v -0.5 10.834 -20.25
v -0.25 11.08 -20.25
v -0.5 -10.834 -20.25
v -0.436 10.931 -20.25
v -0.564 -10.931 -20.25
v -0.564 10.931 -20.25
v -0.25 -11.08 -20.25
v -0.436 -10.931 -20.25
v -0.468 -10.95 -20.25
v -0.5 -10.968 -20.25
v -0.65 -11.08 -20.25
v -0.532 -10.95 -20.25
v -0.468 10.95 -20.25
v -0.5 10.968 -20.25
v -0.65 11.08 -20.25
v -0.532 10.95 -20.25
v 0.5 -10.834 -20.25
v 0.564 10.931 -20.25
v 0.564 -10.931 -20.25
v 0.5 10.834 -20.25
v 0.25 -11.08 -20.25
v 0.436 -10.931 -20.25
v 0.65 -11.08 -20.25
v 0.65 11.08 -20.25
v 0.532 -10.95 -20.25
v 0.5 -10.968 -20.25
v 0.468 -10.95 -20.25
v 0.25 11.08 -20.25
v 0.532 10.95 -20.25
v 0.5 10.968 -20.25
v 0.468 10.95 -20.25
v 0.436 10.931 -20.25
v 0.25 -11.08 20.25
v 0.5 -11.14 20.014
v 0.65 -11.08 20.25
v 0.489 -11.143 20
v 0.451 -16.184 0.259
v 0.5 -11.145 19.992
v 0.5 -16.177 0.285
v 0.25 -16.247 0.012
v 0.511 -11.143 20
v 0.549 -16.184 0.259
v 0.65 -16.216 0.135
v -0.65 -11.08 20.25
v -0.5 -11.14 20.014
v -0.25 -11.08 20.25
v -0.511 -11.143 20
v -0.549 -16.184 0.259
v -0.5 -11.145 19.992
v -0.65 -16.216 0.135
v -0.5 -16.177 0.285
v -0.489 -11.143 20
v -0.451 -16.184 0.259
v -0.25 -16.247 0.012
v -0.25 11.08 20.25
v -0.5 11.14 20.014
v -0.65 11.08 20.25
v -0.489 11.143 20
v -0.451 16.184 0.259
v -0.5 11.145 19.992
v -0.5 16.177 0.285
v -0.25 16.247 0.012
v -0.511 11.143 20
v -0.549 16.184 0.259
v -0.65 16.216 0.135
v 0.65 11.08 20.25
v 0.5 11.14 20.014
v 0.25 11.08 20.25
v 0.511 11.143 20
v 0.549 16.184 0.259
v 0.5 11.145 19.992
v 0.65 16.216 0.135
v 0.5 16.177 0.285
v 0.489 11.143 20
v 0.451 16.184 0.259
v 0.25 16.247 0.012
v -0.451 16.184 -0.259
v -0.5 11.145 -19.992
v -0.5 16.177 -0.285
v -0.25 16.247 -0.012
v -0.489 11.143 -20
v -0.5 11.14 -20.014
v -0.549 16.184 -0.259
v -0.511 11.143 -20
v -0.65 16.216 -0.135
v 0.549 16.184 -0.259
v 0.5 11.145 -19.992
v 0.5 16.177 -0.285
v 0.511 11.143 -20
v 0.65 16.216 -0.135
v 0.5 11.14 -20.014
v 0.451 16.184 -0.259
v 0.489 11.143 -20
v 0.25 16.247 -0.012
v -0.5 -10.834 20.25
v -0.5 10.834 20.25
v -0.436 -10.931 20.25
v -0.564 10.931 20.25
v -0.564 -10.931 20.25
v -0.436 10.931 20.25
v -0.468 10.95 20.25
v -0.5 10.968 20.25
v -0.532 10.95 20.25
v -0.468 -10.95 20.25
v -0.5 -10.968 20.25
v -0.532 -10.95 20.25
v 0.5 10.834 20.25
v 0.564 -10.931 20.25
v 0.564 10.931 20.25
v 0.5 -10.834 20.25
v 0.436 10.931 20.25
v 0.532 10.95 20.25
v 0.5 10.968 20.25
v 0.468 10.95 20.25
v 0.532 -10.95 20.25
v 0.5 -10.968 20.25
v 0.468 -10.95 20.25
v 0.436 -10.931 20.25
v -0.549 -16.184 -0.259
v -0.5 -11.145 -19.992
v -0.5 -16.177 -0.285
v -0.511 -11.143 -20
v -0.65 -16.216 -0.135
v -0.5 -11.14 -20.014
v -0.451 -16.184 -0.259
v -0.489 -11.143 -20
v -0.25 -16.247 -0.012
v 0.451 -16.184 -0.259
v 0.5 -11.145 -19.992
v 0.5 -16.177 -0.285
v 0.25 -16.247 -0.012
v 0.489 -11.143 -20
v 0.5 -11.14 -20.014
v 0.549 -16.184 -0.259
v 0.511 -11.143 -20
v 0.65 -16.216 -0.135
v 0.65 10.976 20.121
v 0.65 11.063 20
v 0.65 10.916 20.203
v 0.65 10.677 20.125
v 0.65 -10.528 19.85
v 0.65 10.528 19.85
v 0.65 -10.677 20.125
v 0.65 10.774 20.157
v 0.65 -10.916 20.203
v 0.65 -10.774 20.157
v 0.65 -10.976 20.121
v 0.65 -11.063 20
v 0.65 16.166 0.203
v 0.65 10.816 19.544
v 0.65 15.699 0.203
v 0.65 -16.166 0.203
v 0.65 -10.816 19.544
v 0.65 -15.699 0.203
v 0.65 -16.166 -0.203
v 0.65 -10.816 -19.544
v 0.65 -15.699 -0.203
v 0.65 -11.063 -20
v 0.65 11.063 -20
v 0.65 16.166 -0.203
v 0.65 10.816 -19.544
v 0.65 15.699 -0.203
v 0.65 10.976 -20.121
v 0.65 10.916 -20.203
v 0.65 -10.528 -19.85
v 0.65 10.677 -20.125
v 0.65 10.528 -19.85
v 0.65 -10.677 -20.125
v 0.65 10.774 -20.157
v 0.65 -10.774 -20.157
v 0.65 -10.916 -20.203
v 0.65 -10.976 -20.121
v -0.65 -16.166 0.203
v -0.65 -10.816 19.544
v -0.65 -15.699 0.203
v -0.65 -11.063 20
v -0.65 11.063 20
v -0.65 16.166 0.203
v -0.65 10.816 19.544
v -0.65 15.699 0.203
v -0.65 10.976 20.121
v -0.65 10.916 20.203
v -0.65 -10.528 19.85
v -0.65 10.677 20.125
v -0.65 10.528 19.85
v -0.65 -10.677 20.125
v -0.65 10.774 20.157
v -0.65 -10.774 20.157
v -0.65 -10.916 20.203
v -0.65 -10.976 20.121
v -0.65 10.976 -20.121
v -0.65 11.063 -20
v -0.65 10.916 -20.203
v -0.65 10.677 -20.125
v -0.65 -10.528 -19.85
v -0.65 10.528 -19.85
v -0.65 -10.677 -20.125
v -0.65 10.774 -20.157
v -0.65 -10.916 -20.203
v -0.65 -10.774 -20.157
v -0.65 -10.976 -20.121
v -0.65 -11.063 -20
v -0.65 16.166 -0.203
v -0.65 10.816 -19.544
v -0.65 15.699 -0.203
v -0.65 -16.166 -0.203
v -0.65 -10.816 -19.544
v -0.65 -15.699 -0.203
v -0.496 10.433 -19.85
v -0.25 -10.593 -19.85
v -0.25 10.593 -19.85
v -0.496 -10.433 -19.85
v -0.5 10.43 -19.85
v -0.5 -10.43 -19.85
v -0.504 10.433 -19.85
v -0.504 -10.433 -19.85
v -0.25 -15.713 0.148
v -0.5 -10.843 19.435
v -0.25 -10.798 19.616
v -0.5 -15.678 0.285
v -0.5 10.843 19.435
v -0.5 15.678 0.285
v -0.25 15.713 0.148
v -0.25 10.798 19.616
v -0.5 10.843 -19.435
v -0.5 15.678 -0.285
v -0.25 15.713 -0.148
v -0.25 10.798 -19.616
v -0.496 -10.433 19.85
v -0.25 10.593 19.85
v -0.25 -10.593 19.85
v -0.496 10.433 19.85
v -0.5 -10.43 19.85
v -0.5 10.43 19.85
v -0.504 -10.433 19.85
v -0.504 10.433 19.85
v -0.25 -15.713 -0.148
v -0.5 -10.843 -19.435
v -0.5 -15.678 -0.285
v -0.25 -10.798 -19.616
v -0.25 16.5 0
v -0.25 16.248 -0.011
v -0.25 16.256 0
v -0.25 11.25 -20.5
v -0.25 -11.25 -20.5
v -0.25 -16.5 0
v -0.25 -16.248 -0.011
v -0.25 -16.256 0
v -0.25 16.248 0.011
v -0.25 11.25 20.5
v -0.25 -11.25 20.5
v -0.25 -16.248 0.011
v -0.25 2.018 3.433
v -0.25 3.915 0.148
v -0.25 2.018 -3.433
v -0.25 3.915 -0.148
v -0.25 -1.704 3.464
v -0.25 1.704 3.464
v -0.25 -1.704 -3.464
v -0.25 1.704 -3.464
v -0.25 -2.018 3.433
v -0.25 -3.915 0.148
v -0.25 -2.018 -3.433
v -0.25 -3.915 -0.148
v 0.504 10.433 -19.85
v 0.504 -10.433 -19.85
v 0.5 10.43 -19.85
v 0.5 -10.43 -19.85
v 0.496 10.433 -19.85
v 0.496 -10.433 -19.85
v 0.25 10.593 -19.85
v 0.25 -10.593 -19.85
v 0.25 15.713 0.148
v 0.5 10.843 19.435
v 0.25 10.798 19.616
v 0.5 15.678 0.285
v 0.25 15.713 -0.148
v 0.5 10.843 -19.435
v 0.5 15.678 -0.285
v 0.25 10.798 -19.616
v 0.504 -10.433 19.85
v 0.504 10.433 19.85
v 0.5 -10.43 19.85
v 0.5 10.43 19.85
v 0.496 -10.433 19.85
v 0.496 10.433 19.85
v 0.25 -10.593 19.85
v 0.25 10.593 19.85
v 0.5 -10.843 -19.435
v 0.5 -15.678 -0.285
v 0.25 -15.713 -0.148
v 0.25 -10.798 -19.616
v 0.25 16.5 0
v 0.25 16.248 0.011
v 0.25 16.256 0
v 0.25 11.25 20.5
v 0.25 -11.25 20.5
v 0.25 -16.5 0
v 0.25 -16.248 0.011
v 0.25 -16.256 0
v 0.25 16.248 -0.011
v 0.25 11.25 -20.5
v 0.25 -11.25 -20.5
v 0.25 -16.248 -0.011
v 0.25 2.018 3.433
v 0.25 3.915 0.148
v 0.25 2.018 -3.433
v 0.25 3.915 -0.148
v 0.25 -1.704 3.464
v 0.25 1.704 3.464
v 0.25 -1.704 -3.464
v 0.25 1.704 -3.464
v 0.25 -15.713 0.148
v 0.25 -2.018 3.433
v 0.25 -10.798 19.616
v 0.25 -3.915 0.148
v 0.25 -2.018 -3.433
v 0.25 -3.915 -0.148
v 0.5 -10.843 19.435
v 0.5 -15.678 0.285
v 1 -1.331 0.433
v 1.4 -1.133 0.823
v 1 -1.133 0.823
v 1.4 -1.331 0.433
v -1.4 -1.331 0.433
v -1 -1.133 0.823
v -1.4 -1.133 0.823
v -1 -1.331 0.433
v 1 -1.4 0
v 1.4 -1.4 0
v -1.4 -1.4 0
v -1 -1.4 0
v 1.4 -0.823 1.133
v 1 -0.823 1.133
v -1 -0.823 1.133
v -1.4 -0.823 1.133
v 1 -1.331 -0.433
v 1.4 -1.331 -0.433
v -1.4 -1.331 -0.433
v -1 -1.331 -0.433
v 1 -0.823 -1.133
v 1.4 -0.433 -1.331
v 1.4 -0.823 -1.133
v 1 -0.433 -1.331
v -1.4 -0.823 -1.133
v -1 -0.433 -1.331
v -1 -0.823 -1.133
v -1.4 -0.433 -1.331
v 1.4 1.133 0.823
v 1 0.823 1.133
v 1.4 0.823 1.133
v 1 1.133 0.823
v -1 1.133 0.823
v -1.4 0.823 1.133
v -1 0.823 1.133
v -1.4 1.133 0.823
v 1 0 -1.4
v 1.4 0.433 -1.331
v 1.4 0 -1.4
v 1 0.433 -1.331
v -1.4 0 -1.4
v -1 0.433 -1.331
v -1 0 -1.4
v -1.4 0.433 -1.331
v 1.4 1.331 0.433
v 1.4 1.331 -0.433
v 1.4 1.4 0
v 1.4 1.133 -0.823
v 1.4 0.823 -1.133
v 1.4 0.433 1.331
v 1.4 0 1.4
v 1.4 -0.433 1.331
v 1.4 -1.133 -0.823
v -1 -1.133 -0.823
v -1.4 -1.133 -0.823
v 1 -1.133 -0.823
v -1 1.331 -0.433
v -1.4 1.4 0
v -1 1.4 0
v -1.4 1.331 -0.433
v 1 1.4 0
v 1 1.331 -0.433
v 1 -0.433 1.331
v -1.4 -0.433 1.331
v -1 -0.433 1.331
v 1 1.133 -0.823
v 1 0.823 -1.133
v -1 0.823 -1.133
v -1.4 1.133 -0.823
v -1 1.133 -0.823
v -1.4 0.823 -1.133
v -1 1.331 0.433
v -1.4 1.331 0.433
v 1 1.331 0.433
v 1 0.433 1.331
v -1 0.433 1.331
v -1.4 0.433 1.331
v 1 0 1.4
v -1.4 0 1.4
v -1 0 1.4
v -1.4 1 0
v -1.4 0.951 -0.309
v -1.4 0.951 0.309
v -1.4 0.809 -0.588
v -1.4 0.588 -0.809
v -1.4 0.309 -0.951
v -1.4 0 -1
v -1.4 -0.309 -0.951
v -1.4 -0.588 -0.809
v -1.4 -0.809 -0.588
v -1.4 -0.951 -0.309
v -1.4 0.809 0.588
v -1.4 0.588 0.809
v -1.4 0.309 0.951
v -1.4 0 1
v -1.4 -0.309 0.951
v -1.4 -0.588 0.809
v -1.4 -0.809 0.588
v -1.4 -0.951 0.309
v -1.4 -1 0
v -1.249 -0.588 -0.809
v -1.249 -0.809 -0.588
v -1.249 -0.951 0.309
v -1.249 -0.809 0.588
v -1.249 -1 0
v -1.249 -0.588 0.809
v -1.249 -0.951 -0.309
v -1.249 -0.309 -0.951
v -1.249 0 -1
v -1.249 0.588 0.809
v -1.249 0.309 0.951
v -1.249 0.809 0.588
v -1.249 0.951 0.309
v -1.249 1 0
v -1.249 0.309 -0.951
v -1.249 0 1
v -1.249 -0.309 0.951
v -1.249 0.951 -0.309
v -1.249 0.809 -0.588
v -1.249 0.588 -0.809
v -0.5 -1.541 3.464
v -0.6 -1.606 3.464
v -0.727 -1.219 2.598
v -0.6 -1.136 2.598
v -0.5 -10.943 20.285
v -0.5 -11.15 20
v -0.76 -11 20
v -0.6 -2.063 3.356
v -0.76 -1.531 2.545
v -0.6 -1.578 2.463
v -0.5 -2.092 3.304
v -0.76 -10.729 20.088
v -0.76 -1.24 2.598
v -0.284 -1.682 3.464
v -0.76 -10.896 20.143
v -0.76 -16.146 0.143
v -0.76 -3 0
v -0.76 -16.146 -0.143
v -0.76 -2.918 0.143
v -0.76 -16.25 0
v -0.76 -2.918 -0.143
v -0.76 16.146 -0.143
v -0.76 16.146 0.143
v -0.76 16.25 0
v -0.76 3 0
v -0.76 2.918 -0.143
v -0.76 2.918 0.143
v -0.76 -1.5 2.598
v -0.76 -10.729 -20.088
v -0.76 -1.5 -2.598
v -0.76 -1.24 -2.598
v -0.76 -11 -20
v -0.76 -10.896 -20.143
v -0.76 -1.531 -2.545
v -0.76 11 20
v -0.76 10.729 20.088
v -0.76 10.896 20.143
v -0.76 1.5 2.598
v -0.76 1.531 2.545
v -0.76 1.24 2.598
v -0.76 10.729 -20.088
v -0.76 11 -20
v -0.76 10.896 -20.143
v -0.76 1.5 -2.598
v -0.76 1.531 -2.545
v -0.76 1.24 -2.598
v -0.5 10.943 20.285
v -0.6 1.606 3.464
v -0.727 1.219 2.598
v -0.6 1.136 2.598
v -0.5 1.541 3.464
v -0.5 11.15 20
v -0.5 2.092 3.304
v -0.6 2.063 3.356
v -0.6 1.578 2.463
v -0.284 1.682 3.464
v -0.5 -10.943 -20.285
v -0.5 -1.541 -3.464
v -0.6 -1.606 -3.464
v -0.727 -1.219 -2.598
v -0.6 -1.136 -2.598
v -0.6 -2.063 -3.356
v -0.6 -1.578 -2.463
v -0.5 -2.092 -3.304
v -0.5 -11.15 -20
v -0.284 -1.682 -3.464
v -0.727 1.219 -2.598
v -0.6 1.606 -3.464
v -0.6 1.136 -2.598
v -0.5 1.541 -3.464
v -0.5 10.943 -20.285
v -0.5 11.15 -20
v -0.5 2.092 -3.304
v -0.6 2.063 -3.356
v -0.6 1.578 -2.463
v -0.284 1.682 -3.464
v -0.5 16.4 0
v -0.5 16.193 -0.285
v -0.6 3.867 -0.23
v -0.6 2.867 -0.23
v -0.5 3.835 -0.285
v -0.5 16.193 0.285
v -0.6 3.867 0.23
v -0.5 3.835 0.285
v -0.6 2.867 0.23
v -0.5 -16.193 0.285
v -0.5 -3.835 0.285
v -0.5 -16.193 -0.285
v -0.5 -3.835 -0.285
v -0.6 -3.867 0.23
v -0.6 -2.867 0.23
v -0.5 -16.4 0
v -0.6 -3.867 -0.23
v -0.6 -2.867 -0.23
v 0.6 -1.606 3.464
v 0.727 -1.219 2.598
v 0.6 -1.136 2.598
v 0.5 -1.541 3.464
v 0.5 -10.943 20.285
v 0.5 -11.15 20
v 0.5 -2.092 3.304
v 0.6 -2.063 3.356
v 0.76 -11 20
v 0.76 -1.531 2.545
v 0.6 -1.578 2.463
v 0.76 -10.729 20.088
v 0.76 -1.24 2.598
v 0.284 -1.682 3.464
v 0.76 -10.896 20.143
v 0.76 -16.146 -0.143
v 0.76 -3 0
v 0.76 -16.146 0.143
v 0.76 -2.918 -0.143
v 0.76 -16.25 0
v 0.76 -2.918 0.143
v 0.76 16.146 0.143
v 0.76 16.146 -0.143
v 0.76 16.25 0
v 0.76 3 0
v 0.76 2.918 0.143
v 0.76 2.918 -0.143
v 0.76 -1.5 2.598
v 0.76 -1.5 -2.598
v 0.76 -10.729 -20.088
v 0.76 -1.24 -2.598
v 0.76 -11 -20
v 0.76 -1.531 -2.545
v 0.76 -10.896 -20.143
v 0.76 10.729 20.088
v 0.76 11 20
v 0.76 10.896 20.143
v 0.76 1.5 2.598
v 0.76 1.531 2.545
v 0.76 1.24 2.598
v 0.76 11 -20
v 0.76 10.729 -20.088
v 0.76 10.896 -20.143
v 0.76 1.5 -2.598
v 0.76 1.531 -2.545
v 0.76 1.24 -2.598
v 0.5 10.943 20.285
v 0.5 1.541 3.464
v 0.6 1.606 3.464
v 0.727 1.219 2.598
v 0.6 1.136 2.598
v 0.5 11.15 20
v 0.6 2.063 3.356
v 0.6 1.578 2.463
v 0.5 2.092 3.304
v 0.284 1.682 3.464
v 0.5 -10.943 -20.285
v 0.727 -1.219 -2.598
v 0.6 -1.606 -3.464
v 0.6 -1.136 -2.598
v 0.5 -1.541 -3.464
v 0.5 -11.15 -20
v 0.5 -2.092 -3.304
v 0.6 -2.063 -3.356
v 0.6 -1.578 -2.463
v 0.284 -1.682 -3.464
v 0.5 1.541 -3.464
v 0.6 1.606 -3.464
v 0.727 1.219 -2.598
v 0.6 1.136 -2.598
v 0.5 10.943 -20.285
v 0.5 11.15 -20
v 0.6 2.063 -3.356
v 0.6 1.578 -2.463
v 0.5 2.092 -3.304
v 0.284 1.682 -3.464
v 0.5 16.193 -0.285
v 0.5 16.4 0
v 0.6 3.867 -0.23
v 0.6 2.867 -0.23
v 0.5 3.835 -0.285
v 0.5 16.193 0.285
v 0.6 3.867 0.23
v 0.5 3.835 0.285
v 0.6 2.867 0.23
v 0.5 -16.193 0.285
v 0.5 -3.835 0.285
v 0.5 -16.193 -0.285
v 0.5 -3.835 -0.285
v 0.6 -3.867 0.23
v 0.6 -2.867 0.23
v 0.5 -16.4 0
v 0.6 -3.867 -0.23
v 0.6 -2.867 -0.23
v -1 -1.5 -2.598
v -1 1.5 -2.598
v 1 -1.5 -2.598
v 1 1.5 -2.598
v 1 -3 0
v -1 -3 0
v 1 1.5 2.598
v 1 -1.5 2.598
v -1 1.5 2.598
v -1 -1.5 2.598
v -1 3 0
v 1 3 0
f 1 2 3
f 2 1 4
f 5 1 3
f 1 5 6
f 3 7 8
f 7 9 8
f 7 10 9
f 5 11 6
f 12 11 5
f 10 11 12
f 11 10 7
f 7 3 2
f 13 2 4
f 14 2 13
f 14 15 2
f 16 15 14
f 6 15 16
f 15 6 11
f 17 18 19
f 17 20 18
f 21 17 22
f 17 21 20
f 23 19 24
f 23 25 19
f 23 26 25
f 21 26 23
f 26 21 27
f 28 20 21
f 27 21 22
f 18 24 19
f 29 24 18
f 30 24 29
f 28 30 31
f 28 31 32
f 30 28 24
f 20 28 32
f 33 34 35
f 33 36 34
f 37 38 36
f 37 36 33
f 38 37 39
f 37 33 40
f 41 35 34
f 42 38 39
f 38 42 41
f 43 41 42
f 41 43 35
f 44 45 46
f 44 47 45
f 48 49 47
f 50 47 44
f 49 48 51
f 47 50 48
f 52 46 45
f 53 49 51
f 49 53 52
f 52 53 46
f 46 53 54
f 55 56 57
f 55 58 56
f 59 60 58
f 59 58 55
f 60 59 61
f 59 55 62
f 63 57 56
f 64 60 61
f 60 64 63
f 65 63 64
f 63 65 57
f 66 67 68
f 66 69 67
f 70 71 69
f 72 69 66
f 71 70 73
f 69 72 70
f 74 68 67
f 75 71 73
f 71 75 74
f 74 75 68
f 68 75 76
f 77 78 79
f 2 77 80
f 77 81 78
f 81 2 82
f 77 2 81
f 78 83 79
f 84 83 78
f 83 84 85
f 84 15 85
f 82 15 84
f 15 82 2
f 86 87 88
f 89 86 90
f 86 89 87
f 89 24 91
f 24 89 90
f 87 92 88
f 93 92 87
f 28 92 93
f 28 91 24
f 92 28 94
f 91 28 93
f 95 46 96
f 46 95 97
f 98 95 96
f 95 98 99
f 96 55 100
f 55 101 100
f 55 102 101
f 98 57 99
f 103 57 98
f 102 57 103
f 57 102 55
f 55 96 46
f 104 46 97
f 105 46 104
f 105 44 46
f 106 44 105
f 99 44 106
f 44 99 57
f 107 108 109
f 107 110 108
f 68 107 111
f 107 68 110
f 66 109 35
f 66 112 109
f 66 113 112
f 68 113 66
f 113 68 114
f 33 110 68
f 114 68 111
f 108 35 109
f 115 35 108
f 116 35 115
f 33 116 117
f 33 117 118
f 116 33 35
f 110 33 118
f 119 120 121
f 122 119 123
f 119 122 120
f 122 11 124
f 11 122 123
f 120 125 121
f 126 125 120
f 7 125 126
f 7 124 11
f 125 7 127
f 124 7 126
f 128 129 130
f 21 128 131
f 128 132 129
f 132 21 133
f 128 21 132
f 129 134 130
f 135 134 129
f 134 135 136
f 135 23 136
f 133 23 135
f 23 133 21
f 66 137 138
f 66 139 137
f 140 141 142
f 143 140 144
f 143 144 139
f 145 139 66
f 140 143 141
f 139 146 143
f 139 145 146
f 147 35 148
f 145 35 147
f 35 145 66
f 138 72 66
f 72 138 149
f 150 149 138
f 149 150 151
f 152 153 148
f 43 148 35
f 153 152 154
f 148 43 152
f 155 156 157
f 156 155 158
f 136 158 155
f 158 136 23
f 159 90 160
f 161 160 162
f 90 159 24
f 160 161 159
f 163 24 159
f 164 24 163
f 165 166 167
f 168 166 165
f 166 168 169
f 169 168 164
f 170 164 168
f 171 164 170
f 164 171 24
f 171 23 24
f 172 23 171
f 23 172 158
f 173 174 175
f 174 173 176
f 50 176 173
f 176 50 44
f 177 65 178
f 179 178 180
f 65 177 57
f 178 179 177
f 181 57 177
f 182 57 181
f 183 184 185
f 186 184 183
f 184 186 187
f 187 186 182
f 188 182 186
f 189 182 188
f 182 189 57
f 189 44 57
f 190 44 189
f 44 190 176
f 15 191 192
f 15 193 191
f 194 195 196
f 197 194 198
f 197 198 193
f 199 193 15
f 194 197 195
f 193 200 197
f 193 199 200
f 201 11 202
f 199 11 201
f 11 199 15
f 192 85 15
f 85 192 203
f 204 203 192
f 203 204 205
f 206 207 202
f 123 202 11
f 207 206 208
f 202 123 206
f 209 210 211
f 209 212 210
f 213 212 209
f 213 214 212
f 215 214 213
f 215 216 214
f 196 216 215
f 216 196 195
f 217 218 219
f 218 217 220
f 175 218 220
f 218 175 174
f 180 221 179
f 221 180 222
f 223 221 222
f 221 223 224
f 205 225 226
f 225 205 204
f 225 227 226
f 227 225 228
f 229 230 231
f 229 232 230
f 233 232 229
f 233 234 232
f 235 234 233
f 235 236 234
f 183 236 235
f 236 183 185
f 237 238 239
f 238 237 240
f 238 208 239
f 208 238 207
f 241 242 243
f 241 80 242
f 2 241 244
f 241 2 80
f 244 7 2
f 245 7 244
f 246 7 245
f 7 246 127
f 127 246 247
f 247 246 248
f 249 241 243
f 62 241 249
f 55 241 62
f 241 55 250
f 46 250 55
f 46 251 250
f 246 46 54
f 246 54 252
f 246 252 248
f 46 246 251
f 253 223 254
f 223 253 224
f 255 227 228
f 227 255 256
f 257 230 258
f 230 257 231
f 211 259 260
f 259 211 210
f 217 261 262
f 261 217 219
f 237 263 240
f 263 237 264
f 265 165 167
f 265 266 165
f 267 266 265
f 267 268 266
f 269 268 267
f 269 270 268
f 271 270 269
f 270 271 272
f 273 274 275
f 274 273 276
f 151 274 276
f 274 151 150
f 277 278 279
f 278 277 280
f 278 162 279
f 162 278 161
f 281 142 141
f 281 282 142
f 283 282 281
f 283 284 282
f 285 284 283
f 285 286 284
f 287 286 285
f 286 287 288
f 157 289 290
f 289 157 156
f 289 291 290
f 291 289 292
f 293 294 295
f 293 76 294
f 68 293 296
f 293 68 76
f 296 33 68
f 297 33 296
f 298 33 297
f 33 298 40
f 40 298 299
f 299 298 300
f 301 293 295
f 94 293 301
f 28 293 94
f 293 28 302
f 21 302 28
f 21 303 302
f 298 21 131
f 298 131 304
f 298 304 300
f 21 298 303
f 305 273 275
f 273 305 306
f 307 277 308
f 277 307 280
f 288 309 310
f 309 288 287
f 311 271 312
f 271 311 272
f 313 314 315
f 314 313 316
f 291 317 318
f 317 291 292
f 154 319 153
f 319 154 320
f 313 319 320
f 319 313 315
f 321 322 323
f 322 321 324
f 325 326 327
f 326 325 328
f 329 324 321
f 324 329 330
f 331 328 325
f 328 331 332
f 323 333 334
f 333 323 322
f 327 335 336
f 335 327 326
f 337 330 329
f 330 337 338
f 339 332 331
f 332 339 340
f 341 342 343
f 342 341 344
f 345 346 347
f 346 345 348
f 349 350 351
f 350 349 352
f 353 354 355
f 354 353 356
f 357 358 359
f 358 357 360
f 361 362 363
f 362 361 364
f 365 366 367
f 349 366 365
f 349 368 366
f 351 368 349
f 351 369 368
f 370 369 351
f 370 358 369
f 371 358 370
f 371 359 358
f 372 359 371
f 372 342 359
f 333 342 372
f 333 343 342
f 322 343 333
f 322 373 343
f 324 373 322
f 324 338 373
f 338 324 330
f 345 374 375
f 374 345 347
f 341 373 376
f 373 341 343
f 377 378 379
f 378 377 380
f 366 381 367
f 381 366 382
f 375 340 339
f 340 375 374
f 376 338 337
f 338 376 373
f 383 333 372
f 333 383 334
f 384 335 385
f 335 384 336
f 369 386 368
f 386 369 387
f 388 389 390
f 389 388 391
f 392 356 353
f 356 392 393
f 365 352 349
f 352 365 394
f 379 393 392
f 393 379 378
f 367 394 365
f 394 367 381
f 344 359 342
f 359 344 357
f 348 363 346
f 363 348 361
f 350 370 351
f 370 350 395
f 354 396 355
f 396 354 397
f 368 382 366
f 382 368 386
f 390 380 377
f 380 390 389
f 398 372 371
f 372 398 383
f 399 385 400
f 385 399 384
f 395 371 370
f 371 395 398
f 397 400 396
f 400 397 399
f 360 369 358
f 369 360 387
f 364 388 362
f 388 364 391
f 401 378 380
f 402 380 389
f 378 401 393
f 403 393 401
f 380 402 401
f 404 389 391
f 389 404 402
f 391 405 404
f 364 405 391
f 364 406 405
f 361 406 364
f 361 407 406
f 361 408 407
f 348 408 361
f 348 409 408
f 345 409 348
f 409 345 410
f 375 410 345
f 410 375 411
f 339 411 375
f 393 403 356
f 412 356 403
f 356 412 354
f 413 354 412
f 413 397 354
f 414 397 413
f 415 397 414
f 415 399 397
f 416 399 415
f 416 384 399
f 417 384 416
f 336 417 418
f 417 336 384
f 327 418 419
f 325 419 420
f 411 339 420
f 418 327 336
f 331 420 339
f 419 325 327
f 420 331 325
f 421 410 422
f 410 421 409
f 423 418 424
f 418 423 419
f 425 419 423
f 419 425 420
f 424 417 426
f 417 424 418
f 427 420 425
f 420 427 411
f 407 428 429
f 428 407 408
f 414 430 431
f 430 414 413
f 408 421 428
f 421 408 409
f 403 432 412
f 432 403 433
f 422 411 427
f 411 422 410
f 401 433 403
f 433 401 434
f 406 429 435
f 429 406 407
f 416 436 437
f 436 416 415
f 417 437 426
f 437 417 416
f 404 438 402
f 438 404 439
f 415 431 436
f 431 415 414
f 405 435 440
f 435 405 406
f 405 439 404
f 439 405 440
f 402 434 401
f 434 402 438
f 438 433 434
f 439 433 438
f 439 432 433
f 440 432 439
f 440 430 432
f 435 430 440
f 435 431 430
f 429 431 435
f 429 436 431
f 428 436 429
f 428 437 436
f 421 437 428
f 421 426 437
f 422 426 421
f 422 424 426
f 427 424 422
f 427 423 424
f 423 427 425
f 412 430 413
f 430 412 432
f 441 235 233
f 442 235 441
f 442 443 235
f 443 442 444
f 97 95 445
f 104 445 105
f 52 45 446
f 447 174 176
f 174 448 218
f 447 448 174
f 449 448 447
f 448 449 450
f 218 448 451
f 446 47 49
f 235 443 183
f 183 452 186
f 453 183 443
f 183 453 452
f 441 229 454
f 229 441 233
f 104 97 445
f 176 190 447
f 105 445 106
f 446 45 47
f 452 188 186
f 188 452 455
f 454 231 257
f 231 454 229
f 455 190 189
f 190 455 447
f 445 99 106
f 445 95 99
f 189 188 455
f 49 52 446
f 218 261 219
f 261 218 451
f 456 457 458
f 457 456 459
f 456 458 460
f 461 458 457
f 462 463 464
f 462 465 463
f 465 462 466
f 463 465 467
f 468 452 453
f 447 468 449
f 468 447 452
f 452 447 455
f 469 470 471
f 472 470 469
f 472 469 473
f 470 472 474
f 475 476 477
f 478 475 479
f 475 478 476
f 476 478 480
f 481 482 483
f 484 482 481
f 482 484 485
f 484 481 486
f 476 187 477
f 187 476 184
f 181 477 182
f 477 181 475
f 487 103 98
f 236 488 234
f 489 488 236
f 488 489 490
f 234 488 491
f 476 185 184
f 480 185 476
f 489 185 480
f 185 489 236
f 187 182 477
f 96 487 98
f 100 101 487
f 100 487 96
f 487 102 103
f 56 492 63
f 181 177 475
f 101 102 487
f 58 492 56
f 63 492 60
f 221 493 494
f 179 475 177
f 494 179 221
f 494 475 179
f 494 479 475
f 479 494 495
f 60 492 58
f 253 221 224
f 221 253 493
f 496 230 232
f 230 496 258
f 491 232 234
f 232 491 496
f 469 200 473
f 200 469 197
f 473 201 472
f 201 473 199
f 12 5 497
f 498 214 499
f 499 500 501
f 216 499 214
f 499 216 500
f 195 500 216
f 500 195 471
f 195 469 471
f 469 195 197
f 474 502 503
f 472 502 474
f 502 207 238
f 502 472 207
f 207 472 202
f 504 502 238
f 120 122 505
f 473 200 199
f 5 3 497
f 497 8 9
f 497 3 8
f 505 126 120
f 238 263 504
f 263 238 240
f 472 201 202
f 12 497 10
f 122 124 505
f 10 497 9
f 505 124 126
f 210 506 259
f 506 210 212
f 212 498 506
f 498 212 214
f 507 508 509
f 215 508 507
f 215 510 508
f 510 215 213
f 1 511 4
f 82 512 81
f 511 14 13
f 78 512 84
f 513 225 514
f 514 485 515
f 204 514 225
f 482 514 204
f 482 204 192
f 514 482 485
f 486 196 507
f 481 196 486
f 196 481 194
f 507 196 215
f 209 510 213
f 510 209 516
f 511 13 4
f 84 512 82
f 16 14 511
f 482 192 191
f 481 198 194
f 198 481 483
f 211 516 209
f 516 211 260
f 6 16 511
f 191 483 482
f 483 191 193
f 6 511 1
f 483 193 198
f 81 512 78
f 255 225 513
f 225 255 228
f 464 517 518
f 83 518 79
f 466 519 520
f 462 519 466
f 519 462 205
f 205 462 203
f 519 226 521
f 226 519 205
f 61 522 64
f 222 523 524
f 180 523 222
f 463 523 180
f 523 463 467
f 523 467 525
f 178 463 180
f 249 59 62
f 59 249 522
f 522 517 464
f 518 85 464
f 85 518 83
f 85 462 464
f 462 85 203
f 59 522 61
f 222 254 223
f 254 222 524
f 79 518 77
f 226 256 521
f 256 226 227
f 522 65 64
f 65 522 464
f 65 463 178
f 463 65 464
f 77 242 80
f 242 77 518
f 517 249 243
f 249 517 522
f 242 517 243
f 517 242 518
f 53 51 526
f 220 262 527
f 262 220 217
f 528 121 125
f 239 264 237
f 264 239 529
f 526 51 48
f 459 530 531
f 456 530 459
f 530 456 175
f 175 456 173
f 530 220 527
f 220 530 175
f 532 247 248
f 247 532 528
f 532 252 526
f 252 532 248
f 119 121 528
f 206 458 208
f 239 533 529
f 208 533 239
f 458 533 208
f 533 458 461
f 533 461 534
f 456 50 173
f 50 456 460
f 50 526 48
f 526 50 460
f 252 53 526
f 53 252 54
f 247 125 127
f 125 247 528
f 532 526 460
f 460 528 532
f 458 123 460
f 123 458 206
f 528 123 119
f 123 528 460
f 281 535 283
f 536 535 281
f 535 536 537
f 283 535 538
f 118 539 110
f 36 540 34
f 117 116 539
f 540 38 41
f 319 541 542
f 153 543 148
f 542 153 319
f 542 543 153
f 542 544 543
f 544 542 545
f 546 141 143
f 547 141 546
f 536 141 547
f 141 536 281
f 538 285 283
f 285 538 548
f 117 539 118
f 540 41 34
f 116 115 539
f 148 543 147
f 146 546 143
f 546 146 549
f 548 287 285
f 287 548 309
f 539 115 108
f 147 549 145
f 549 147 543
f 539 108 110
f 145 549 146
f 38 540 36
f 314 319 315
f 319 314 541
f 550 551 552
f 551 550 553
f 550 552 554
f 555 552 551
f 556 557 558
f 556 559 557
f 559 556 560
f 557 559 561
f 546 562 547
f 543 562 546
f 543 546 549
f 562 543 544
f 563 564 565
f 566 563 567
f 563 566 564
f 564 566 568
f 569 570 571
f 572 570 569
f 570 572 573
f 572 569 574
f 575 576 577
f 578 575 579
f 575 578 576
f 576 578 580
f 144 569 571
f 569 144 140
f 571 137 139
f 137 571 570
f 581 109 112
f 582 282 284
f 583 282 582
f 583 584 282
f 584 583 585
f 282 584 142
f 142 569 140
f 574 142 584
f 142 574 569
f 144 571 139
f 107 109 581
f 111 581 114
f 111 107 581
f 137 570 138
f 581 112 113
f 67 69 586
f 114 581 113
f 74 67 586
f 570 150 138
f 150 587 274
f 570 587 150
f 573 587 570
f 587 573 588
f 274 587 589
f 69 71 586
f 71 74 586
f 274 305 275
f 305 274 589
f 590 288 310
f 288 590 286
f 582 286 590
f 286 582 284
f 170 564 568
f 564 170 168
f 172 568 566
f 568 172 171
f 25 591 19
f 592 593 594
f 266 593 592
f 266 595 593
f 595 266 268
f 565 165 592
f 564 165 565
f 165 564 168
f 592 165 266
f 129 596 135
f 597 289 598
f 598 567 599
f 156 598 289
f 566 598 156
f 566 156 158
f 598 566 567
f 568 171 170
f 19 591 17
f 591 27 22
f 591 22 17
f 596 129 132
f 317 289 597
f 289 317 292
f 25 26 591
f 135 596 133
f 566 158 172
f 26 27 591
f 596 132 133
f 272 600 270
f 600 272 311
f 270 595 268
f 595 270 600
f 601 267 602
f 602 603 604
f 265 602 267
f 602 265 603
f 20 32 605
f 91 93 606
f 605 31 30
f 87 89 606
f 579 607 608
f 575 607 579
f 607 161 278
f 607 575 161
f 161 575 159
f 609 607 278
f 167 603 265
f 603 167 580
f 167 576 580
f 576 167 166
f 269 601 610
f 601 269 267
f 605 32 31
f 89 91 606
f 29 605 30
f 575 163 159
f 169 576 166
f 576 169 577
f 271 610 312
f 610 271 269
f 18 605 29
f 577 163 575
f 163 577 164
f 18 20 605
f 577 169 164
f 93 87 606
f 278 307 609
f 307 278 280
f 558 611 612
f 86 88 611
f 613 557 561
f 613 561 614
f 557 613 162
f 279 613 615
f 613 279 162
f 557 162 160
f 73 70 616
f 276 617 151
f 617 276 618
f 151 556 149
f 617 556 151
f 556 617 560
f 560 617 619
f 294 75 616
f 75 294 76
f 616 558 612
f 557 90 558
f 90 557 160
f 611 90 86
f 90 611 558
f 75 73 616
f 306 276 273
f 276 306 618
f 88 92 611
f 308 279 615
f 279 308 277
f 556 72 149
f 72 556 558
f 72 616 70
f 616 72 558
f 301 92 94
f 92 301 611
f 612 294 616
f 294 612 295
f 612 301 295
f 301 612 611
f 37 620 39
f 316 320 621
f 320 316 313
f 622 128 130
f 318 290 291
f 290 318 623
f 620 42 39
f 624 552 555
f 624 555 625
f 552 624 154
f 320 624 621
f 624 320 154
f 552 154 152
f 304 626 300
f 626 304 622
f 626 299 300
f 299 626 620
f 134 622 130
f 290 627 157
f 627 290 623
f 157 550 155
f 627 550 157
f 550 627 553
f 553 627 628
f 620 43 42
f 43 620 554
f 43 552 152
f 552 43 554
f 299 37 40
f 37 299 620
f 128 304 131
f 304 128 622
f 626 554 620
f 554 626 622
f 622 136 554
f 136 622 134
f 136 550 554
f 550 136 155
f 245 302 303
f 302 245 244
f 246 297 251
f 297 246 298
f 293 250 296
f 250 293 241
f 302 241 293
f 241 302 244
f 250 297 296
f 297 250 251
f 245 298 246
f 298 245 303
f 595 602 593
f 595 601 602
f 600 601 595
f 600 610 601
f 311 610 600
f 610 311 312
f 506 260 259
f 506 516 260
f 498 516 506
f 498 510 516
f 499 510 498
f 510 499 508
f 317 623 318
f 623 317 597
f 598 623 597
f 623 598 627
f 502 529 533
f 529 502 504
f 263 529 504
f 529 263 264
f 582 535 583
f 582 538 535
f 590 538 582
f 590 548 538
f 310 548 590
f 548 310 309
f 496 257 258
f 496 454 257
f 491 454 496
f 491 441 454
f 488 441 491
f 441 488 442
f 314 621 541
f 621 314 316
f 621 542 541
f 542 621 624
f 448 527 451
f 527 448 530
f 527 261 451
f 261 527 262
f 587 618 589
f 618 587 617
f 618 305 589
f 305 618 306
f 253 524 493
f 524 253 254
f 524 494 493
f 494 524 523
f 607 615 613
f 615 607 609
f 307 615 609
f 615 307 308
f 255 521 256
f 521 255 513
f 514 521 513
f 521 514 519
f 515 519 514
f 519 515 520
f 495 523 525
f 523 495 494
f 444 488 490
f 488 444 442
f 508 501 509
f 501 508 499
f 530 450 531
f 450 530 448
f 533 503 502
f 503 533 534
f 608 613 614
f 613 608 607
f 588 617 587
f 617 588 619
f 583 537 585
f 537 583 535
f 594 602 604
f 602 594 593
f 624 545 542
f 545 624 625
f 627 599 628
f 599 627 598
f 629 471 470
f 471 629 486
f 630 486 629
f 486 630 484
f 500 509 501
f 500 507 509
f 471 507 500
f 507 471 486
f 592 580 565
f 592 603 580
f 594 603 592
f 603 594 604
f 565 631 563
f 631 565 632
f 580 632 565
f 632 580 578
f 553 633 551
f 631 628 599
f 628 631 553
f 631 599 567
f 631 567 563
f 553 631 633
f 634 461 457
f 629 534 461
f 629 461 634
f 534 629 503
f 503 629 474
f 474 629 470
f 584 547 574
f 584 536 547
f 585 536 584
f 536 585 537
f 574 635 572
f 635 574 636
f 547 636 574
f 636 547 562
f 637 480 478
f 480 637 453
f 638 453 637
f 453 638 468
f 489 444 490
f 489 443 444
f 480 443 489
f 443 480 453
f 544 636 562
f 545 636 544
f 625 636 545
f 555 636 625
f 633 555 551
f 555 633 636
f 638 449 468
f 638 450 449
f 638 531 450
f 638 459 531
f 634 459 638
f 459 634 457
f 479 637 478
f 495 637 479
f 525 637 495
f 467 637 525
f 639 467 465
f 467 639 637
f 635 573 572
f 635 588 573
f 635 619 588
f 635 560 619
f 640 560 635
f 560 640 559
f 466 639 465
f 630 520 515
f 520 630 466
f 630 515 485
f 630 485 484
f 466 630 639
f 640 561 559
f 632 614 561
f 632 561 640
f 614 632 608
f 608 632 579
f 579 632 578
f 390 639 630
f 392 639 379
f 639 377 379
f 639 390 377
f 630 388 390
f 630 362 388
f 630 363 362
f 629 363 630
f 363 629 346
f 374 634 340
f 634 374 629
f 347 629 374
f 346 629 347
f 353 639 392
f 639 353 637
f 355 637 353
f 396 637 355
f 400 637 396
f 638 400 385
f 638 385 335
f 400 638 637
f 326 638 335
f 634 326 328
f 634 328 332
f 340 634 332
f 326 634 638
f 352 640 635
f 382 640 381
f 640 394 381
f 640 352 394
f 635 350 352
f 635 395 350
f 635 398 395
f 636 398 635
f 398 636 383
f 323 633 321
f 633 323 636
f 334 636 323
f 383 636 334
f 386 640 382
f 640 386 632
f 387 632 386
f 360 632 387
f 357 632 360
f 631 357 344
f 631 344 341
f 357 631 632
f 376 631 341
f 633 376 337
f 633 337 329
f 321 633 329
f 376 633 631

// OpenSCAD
epsilon = 0.001;
a = [0 - epsilon, 41/2];
b = [22.5/2, 41/2];
c = [33/2, 0];
d = [22.5/2, -41/2];
e = [0 - epsilon, -41/2];

rotate([0,0,-90]) rotate([90,0,0]) panel();

module panel() {
	/* basic panel */
	translate([0,0,-0.25]) linear_extrude(height=0.5) {
		polygon(points=[a,b,c,d,e],paths=[[0,1,2,3,4,5,0]]);
		mirror([1,0,0]) polygon(points=[a,b,c,d,e],paths=[[0,1,2,3,4,5,0]]);
	}

	render() difference() {
		translate([0,0,-0.65]) scale([(33-0.5)/33, (41-0.5)/41,1])
		linear_extrude(height=1.3) {
			polygon(points=[a,b,c,d,e],paths=[[0,1,2,3,4,5,0]]);
			mirror([1,0,0]) polygon(points=[a,b,c,d,e],paths=[[0,1,2,3,4,5,0]]);
		}
		translate([0,0,0.25]) scale([(33 - 1.5)/ 33, (41 - 1.3)/41, 1])
		linear_extrude(height=0.5) {
			polygon(points=[a,b,c,d,e],paths=[[0,1,2,3,4,5,0]]);
			mirror([1,0,0]) polygon(points=[a,b,c,d,e],paths=[[0,1,2,3,4,5,0]]);
		}
		translate([0,0,-0.75]) scale([(33 - 1.5)/ 33, (41 - 1.3)/41, 1])
		linear_extrude(height=0.5) {
			polygon(points=[a,b,c,d,e],paths=[[0,1,2,3,4,5,0]]);
			mirror([1,0,0]) polygon(points=[a,b,c,d,e],paths=[[0,1,2,3,4,5,0]]);
		}
	}

	/* center piece */
	cylinder($fn=6,r=4,h=1.2, center=true);
	cylinder($fn=6,r=3,h=2.0, center=true);
	difference() {
		cylinder($fn=20,r=1.4,h=2.8,center=true);
		translate([0,0,1.4]) cylinder($fn=20,r=1.0,h=0.3+epsilon,center=true);
	}

	/* spines */
	spines();
	mirror([0,0,1]) spines();
}

module spines() {
	diagSpine();
	mirror([1,0,0]) diagSpine();
	mirror([0,1,0]) diagSpine();
	mirror([1,0,0]) mirror([0,1,0]) diagSpine();

	mirror([1,0,0]) hull() {
		translate([33/2-0.4,0,0.5]) sphere(r=0.3);
		translate([0,0,0.5]) sphere(r=0.3);
	}
	hull() {
		translate([33/2-0.4,0,0.5]) sphere(r=0.3);
		translate([0,0,0.5]) sphere(r=0.3);
	}
}

module diagSpine() {
	hull() {
		translate([22.5/2-0.4, 41/2-0.5,0.5]) sphere(r=0.3);
		translate([0,0,0.5]) sphere(r=0.3);
	}
}
